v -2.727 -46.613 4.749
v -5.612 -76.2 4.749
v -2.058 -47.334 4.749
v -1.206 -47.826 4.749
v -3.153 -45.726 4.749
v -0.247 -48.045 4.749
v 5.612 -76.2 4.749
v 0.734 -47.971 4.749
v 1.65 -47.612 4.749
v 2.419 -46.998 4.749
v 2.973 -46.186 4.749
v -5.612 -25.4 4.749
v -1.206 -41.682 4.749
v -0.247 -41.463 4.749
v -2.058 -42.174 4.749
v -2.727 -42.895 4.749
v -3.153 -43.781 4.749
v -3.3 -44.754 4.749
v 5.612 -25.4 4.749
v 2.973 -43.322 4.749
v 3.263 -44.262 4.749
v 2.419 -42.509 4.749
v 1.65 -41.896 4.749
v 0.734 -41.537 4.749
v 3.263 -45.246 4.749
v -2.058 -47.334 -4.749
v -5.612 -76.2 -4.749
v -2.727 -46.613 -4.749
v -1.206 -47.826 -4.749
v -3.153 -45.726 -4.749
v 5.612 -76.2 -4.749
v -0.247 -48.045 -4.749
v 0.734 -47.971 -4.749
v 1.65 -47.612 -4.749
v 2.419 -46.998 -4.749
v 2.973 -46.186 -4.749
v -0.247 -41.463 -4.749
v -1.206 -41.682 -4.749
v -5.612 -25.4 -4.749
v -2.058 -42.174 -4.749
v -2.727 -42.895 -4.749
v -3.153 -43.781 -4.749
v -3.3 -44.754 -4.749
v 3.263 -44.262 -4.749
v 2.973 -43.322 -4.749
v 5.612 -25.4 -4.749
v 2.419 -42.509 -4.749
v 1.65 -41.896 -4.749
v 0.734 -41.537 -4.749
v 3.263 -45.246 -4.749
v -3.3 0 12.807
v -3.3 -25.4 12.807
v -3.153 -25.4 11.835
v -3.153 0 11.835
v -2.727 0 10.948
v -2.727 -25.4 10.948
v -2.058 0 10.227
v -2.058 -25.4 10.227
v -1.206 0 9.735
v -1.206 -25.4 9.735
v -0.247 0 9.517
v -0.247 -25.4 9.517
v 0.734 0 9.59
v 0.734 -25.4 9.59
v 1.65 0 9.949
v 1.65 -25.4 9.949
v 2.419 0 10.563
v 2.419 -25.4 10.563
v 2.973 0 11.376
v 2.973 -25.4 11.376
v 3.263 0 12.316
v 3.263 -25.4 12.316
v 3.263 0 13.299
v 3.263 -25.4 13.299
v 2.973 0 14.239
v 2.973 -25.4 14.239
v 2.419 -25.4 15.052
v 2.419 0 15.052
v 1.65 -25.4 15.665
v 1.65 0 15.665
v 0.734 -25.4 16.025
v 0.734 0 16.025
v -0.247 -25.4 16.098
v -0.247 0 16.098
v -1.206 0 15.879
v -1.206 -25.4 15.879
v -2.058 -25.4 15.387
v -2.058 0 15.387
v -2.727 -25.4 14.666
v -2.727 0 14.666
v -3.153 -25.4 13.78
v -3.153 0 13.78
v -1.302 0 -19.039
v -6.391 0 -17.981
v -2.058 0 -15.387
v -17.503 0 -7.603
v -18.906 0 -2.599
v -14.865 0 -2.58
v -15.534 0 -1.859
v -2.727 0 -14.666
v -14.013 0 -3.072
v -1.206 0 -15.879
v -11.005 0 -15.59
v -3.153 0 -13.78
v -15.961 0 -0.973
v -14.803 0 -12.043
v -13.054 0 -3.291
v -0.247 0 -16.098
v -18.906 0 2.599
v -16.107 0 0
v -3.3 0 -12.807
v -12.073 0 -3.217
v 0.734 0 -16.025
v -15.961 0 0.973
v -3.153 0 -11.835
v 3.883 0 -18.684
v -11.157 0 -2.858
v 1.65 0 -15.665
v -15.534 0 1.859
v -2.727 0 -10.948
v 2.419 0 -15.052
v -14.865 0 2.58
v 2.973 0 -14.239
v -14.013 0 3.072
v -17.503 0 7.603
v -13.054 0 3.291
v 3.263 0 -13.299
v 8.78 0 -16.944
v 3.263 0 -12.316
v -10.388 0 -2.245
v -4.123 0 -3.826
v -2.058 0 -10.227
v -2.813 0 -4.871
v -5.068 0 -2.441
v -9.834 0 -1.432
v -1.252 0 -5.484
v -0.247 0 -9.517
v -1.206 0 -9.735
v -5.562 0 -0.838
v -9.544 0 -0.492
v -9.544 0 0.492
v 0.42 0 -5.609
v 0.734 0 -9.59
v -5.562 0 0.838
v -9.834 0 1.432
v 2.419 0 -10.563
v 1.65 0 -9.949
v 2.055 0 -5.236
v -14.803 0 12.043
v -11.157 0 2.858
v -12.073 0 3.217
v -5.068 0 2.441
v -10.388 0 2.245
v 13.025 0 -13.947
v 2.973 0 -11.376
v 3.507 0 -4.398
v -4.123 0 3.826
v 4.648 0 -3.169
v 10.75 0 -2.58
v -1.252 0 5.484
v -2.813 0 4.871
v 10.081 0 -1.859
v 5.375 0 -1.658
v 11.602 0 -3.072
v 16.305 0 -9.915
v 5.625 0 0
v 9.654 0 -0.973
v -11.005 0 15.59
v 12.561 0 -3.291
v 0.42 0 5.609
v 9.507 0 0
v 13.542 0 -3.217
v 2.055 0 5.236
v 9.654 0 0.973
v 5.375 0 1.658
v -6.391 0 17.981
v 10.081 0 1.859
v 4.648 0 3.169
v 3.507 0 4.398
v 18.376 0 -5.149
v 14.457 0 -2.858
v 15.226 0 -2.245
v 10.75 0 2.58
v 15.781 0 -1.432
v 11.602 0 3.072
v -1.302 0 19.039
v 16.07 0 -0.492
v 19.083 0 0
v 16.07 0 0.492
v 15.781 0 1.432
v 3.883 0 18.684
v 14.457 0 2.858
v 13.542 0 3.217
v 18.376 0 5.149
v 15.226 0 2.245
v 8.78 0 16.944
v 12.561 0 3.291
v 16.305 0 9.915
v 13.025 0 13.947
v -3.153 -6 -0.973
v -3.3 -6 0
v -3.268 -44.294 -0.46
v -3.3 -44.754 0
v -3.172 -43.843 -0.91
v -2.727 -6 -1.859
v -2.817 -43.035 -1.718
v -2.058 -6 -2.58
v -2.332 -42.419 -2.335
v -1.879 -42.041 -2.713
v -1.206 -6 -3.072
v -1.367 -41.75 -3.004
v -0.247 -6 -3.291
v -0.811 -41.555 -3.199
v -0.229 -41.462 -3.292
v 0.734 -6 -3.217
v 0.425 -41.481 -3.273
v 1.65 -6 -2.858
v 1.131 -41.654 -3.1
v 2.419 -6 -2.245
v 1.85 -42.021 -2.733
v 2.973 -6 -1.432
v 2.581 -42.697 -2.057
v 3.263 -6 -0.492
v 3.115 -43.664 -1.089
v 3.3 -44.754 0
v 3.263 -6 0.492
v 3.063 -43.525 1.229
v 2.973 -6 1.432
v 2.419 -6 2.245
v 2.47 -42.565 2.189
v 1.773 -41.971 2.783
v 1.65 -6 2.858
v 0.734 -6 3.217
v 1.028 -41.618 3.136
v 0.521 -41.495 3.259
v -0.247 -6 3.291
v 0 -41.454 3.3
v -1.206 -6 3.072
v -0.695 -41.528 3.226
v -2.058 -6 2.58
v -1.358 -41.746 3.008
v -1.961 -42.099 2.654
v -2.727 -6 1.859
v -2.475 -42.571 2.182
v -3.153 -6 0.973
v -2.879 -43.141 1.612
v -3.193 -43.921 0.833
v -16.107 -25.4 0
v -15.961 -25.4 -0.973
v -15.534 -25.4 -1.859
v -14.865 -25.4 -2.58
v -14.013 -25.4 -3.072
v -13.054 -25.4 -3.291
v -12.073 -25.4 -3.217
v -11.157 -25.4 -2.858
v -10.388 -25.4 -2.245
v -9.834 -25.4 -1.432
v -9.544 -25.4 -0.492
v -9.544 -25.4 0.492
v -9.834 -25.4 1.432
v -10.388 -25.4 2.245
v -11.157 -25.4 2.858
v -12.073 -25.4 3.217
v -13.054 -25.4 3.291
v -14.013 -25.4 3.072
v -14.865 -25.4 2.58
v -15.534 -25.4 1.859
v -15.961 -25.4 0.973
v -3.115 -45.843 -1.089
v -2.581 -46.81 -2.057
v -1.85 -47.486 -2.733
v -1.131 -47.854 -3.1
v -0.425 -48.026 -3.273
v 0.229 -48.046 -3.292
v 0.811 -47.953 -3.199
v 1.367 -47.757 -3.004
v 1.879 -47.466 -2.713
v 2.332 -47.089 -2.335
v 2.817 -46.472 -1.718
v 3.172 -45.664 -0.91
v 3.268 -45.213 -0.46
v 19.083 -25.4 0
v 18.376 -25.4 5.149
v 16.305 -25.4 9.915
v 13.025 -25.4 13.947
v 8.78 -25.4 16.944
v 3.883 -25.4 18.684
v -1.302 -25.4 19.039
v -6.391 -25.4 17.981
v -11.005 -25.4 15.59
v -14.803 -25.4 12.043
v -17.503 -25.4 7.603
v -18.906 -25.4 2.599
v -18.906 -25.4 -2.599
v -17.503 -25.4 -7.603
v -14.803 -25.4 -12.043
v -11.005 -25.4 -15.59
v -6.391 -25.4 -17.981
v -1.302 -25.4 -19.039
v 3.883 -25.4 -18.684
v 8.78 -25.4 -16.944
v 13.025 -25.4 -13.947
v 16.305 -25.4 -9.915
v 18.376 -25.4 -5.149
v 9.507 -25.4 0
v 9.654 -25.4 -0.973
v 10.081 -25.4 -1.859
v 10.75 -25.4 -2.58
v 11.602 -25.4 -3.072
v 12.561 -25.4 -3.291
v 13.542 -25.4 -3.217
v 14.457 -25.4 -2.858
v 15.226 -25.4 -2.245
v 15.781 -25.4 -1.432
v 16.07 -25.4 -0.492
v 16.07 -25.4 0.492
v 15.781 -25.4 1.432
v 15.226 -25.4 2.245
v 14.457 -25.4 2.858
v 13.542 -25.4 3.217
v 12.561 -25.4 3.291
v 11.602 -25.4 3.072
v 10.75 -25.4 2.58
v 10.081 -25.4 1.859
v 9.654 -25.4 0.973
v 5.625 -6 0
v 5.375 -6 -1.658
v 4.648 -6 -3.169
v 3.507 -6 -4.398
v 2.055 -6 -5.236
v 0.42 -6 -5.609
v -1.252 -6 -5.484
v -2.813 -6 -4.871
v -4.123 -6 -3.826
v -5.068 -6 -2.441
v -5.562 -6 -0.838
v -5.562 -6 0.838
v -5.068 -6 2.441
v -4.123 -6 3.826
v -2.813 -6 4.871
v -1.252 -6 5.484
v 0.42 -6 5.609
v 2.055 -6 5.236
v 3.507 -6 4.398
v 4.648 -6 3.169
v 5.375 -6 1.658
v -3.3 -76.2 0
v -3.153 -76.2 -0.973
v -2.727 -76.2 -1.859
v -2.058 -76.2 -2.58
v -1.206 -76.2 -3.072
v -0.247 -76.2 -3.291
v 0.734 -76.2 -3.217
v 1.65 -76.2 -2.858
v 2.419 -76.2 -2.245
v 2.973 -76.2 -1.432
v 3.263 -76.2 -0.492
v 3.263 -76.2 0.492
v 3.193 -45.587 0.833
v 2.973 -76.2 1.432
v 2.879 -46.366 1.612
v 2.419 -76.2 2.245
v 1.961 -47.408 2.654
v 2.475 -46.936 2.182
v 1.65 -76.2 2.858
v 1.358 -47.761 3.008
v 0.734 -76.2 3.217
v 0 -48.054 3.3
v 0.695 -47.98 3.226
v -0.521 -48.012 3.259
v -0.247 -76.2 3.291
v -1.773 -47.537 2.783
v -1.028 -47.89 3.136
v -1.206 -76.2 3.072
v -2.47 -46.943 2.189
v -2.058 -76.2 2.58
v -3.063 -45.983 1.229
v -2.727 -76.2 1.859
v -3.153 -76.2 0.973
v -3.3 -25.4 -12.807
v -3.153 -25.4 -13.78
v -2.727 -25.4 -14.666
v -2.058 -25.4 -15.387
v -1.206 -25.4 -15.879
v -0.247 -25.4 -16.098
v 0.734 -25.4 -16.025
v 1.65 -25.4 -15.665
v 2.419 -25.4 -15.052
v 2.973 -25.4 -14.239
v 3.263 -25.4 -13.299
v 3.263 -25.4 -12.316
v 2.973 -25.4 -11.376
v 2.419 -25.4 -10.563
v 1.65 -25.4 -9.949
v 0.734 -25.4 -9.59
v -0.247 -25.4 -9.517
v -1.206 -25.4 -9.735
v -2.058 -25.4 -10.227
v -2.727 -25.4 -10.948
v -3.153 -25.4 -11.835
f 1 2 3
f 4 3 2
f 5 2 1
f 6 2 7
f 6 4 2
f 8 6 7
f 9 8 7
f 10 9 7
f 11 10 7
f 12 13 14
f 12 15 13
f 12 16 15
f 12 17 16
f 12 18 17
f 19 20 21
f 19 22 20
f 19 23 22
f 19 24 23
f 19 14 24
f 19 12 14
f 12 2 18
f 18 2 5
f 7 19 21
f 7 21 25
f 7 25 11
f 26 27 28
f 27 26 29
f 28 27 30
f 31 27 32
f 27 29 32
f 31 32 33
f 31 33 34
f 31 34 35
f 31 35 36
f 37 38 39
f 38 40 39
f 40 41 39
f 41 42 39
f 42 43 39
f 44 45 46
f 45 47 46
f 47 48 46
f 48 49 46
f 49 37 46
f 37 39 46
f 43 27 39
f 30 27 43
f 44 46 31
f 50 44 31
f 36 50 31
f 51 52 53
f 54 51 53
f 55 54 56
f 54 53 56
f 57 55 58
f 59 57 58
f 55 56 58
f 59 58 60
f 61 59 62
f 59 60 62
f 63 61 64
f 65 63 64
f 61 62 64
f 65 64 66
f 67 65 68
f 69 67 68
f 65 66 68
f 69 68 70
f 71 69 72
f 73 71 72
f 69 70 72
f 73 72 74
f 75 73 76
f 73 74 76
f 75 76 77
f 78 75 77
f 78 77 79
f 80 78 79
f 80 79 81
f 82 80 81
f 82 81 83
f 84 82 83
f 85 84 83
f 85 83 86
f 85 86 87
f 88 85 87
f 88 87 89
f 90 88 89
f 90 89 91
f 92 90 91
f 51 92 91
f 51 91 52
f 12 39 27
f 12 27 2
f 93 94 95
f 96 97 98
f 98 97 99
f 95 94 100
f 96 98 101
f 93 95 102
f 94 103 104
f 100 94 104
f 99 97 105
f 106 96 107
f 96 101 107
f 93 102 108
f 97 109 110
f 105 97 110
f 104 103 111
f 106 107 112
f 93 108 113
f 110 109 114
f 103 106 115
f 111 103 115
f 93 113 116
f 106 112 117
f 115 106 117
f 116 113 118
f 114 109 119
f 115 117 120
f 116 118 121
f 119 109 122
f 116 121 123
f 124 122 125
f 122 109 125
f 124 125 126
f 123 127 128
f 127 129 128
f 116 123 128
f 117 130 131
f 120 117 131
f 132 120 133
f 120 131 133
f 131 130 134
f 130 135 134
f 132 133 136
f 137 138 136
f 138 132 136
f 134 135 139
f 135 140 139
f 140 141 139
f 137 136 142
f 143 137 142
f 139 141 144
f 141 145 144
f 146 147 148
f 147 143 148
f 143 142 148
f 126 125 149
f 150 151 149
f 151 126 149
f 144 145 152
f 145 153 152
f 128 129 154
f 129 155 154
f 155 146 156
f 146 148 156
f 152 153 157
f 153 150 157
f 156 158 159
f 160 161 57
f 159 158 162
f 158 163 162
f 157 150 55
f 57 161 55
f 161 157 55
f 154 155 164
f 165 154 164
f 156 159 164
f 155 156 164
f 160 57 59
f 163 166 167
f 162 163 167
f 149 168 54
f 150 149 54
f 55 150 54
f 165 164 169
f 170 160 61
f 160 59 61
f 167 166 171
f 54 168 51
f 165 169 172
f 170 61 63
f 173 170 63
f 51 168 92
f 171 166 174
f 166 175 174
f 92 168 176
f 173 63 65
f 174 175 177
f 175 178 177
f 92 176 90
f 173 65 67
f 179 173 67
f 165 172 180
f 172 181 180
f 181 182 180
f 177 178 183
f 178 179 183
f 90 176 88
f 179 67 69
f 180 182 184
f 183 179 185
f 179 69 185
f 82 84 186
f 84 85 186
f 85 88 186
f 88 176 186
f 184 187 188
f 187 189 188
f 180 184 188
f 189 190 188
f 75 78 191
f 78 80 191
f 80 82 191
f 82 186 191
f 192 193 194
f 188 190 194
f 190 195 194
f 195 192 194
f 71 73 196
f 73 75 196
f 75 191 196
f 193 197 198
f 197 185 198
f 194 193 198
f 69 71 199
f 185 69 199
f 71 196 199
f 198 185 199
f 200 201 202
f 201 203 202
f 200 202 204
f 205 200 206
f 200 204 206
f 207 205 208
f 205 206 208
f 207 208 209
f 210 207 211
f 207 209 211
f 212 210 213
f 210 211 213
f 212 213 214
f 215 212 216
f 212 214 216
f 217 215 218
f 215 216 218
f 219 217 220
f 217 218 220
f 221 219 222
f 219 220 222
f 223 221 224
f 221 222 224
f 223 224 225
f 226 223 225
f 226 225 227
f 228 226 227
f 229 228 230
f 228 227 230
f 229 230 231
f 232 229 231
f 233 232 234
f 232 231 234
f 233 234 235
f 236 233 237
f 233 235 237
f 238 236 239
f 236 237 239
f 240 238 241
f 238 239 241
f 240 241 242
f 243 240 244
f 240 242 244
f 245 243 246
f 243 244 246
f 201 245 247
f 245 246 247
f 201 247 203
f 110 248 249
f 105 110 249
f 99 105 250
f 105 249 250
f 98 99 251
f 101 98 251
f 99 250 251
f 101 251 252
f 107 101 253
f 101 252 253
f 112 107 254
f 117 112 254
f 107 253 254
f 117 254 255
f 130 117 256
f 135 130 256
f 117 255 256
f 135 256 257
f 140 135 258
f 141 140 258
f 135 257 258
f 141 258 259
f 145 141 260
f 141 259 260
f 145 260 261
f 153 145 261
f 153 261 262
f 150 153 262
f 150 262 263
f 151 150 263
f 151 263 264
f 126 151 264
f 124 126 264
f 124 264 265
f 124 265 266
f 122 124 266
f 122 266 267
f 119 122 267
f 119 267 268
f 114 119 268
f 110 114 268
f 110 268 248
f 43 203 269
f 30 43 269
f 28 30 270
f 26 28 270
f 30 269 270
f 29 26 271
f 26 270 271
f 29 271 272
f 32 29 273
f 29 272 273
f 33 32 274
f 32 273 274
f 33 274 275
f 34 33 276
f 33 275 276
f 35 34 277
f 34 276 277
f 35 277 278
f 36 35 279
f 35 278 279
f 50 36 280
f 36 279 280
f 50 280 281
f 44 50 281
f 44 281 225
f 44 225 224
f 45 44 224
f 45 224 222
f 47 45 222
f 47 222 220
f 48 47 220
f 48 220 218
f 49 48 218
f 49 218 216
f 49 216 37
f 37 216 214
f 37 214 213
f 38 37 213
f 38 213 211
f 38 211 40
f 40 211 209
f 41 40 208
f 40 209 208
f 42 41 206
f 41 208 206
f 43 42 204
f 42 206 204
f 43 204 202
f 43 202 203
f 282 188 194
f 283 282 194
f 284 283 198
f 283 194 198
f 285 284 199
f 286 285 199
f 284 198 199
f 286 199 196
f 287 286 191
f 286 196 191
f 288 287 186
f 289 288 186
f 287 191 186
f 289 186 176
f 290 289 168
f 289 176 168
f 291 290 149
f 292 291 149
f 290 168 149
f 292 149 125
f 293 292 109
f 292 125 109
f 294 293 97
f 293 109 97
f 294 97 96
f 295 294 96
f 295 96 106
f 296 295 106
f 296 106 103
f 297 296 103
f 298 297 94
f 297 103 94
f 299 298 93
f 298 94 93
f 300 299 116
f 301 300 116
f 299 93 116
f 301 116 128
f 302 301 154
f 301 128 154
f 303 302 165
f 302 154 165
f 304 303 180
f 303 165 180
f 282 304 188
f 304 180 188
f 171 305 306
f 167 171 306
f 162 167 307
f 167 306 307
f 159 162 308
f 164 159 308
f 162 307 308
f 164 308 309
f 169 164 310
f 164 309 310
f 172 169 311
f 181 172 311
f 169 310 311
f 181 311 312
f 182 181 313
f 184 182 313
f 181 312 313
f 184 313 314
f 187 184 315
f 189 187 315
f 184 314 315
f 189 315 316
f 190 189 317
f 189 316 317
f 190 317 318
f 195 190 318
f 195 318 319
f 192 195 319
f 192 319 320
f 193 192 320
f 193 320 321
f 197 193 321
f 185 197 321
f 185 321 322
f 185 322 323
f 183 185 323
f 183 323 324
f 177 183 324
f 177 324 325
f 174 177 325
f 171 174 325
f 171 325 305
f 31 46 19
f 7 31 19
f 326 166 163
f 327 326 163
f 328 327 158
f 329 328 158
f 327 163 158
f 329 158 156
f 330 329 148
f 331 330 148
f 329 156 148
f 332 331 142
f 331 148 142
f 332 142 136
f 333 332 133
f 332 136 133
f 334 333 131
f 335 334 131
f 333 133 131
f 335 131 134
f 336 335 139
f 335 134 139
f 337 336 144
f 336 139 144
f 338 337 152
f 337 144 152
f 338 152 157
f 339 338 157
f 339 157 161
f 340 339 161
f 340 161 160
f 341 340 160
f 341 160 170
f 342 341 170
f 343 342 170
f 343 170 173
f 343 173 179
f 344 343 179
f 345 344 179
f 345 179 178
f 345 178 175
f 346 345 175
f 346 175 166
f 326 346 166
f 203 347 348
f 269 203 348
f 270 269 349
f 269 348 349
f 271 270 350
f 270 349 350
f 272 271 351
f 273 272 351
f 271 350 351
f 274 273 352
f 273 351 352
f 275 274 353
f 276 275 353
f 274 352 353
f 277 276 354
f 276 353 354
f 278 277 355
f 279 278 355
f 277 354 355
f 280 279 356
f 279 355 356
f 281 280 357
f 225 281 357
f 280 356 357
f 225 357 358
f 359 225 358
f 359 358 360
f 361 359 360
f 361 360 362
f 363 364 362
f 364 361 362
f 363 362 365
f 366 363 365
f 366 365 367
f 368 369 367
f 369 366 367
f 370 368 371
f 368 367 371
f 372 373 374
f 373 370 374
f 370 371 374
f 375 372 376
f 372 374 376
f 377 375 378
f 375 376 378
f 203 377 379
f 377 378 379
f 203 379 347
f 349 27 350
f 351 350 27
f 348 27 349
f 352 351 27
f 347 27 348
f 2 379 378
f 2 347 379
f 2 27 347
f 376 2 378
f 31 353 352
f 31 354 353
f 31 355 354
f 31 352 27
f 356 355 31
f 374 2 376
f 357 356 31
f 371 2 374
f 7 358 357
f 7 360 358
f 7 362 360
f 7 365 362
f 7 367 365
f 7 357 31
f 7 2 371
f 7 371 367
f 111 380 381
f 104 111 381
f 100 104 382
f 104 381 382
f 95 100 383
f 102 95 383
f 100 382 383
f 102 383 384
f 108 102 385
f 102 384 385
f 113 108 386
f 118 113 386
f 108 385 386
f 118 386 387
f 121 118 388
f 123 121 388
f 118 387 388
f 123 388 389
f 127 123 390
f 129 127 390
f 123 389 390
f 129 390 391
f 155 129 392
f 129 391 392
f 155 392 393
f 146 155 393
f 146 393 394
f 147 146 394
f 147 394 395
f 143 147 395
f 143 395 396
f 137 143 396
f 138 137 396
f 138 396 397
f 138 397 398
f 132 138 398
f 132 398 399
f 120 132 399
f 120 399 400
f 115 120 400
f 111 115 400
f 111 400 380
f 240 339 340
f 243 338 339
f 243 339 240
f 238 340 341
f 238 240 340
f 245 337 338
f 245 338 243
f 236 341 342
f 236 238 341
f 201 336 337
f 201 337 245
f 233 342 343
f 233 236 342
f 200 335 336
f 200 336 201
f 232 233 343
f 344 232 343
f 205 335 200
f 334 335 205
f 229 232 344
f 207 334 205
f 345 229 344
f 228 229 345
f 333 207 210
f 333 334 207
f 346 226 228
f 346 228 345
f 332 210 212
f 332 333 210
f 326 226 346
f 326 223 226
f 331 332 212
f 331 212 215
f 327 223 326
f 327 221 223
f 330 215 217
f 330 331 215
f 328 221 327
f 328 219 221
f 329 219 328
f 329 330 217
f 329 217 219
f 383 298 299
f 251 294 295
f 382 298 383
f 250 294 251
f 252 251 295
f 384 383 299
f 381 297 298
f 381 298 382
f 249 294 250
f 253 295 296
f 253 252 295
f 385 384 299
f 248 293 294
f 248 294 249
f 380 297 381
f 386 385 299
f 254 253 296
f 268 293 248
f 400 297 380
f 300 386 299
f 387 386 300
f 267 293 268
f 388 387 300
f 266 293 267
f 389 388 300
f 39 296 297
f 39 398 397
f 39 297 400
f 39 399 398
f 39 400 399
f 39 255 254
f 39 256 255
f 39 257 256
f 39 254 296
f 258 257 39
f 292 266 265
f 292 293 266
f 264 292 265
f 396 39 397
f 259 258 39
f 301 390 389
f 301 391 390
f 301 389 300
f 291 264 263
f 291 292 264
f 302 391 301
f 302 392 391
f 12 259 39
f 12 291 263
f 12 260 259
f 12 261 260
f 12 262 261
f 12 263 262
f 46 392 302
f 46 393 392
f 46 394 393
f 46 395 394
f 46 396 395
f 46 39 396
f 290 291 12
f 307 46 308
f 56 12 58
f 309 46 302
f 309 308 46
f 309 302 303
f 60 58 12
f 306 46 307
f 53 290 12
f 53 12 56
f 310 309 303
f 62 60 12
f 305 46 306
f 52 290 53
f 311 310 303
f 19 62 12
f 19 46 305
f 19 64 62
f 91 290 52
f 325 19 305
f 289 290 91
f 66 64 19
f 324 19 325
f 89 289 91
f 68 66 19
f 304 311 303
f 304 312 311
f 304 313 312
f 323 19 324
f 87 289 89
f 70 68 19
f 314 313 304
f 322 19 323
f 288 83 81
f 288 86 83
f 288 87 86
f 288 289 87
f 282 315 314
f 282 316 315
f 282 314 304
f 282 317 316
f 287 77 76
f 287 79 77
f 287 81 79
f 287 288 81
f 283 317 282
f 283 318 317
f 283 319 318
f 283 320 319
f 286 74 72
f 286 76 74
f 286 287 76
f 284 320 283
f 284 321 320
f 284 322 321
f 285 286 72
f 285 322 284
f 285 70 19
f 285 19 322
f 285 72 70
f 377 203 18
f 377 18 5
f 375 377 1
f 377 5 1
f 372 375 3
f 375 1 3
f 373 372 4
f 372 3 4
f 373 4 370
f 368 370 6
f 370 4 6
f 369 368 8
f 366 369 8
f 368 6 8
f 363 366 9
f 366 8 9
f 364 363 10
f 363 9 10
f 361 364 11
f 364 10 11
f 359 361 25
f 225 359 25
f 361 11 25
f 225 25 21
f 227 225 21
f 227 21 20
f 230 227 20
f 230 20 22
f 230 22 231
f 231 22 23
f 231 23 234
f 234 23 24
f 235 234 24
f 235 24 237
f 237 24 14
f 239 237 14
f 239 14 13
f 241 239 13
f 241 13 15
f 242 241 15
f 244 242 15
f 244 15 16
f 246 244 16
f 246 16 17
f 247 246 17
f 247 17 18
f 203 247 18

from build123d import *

# Parameters (mm, degrees)
F0_R           = 19.0832795918
F1_DEPTH       = 25.4
F2_D           = 6.6
F3_W           = 11.2244253978
F3_H           = 9.497590363
F4_DEPTH       = 50.8
F6_D           = 6.6
F7_D           = 6.6
F7_CBORE_D     = 11.25
F7_CBORE_DEPTH = 6


with BuildPart() as f1:
    # F0 (on Front) → F1 (new body)
    with BuildSketch(Plane.XZ):
        Circle(F0_R)
    extrude(amount=F1_DEPTH)

    # F2 (through all)
    with Locations(Plane(origin=(0, 0, 0), x_dir=(1, 0, 0), z_dir=(0, 1, 0))):
        with Locations((0, -12.8073552623), (12.8073552623, 0), (0, 12.8073552623), (-12.8073552623, 0)):
            Hole(F2_D / 2)

    # F3 (on face) → F4 (join)
    with BuildSketch(Plane.XZ.offset(25.4)):
        Rectangle(F3_W, F3_H)
    extrude(amount=F4_DEPTH)

    # F6 (through all)
    with Locations(Plane(origin=(0, 0, -4.7487951815), x_dir=(1, 0, 0), z_dir=(0, 0, -1))):
        with Locations((0, 44.753793627)):
            Hole(F6_D / 2)

    # F7 (through all)
    with Locations(Plane(origin=(0, 0, 0), x_dir=(1, 0, 0), z_dir=(0, 1, 0))):
        with Locations((0, 0)):
            CounterBoreHole(F7_D / 2, F7_CBORE_D / 2, F7_CBORE_DEPTH)


solid = f1.part
